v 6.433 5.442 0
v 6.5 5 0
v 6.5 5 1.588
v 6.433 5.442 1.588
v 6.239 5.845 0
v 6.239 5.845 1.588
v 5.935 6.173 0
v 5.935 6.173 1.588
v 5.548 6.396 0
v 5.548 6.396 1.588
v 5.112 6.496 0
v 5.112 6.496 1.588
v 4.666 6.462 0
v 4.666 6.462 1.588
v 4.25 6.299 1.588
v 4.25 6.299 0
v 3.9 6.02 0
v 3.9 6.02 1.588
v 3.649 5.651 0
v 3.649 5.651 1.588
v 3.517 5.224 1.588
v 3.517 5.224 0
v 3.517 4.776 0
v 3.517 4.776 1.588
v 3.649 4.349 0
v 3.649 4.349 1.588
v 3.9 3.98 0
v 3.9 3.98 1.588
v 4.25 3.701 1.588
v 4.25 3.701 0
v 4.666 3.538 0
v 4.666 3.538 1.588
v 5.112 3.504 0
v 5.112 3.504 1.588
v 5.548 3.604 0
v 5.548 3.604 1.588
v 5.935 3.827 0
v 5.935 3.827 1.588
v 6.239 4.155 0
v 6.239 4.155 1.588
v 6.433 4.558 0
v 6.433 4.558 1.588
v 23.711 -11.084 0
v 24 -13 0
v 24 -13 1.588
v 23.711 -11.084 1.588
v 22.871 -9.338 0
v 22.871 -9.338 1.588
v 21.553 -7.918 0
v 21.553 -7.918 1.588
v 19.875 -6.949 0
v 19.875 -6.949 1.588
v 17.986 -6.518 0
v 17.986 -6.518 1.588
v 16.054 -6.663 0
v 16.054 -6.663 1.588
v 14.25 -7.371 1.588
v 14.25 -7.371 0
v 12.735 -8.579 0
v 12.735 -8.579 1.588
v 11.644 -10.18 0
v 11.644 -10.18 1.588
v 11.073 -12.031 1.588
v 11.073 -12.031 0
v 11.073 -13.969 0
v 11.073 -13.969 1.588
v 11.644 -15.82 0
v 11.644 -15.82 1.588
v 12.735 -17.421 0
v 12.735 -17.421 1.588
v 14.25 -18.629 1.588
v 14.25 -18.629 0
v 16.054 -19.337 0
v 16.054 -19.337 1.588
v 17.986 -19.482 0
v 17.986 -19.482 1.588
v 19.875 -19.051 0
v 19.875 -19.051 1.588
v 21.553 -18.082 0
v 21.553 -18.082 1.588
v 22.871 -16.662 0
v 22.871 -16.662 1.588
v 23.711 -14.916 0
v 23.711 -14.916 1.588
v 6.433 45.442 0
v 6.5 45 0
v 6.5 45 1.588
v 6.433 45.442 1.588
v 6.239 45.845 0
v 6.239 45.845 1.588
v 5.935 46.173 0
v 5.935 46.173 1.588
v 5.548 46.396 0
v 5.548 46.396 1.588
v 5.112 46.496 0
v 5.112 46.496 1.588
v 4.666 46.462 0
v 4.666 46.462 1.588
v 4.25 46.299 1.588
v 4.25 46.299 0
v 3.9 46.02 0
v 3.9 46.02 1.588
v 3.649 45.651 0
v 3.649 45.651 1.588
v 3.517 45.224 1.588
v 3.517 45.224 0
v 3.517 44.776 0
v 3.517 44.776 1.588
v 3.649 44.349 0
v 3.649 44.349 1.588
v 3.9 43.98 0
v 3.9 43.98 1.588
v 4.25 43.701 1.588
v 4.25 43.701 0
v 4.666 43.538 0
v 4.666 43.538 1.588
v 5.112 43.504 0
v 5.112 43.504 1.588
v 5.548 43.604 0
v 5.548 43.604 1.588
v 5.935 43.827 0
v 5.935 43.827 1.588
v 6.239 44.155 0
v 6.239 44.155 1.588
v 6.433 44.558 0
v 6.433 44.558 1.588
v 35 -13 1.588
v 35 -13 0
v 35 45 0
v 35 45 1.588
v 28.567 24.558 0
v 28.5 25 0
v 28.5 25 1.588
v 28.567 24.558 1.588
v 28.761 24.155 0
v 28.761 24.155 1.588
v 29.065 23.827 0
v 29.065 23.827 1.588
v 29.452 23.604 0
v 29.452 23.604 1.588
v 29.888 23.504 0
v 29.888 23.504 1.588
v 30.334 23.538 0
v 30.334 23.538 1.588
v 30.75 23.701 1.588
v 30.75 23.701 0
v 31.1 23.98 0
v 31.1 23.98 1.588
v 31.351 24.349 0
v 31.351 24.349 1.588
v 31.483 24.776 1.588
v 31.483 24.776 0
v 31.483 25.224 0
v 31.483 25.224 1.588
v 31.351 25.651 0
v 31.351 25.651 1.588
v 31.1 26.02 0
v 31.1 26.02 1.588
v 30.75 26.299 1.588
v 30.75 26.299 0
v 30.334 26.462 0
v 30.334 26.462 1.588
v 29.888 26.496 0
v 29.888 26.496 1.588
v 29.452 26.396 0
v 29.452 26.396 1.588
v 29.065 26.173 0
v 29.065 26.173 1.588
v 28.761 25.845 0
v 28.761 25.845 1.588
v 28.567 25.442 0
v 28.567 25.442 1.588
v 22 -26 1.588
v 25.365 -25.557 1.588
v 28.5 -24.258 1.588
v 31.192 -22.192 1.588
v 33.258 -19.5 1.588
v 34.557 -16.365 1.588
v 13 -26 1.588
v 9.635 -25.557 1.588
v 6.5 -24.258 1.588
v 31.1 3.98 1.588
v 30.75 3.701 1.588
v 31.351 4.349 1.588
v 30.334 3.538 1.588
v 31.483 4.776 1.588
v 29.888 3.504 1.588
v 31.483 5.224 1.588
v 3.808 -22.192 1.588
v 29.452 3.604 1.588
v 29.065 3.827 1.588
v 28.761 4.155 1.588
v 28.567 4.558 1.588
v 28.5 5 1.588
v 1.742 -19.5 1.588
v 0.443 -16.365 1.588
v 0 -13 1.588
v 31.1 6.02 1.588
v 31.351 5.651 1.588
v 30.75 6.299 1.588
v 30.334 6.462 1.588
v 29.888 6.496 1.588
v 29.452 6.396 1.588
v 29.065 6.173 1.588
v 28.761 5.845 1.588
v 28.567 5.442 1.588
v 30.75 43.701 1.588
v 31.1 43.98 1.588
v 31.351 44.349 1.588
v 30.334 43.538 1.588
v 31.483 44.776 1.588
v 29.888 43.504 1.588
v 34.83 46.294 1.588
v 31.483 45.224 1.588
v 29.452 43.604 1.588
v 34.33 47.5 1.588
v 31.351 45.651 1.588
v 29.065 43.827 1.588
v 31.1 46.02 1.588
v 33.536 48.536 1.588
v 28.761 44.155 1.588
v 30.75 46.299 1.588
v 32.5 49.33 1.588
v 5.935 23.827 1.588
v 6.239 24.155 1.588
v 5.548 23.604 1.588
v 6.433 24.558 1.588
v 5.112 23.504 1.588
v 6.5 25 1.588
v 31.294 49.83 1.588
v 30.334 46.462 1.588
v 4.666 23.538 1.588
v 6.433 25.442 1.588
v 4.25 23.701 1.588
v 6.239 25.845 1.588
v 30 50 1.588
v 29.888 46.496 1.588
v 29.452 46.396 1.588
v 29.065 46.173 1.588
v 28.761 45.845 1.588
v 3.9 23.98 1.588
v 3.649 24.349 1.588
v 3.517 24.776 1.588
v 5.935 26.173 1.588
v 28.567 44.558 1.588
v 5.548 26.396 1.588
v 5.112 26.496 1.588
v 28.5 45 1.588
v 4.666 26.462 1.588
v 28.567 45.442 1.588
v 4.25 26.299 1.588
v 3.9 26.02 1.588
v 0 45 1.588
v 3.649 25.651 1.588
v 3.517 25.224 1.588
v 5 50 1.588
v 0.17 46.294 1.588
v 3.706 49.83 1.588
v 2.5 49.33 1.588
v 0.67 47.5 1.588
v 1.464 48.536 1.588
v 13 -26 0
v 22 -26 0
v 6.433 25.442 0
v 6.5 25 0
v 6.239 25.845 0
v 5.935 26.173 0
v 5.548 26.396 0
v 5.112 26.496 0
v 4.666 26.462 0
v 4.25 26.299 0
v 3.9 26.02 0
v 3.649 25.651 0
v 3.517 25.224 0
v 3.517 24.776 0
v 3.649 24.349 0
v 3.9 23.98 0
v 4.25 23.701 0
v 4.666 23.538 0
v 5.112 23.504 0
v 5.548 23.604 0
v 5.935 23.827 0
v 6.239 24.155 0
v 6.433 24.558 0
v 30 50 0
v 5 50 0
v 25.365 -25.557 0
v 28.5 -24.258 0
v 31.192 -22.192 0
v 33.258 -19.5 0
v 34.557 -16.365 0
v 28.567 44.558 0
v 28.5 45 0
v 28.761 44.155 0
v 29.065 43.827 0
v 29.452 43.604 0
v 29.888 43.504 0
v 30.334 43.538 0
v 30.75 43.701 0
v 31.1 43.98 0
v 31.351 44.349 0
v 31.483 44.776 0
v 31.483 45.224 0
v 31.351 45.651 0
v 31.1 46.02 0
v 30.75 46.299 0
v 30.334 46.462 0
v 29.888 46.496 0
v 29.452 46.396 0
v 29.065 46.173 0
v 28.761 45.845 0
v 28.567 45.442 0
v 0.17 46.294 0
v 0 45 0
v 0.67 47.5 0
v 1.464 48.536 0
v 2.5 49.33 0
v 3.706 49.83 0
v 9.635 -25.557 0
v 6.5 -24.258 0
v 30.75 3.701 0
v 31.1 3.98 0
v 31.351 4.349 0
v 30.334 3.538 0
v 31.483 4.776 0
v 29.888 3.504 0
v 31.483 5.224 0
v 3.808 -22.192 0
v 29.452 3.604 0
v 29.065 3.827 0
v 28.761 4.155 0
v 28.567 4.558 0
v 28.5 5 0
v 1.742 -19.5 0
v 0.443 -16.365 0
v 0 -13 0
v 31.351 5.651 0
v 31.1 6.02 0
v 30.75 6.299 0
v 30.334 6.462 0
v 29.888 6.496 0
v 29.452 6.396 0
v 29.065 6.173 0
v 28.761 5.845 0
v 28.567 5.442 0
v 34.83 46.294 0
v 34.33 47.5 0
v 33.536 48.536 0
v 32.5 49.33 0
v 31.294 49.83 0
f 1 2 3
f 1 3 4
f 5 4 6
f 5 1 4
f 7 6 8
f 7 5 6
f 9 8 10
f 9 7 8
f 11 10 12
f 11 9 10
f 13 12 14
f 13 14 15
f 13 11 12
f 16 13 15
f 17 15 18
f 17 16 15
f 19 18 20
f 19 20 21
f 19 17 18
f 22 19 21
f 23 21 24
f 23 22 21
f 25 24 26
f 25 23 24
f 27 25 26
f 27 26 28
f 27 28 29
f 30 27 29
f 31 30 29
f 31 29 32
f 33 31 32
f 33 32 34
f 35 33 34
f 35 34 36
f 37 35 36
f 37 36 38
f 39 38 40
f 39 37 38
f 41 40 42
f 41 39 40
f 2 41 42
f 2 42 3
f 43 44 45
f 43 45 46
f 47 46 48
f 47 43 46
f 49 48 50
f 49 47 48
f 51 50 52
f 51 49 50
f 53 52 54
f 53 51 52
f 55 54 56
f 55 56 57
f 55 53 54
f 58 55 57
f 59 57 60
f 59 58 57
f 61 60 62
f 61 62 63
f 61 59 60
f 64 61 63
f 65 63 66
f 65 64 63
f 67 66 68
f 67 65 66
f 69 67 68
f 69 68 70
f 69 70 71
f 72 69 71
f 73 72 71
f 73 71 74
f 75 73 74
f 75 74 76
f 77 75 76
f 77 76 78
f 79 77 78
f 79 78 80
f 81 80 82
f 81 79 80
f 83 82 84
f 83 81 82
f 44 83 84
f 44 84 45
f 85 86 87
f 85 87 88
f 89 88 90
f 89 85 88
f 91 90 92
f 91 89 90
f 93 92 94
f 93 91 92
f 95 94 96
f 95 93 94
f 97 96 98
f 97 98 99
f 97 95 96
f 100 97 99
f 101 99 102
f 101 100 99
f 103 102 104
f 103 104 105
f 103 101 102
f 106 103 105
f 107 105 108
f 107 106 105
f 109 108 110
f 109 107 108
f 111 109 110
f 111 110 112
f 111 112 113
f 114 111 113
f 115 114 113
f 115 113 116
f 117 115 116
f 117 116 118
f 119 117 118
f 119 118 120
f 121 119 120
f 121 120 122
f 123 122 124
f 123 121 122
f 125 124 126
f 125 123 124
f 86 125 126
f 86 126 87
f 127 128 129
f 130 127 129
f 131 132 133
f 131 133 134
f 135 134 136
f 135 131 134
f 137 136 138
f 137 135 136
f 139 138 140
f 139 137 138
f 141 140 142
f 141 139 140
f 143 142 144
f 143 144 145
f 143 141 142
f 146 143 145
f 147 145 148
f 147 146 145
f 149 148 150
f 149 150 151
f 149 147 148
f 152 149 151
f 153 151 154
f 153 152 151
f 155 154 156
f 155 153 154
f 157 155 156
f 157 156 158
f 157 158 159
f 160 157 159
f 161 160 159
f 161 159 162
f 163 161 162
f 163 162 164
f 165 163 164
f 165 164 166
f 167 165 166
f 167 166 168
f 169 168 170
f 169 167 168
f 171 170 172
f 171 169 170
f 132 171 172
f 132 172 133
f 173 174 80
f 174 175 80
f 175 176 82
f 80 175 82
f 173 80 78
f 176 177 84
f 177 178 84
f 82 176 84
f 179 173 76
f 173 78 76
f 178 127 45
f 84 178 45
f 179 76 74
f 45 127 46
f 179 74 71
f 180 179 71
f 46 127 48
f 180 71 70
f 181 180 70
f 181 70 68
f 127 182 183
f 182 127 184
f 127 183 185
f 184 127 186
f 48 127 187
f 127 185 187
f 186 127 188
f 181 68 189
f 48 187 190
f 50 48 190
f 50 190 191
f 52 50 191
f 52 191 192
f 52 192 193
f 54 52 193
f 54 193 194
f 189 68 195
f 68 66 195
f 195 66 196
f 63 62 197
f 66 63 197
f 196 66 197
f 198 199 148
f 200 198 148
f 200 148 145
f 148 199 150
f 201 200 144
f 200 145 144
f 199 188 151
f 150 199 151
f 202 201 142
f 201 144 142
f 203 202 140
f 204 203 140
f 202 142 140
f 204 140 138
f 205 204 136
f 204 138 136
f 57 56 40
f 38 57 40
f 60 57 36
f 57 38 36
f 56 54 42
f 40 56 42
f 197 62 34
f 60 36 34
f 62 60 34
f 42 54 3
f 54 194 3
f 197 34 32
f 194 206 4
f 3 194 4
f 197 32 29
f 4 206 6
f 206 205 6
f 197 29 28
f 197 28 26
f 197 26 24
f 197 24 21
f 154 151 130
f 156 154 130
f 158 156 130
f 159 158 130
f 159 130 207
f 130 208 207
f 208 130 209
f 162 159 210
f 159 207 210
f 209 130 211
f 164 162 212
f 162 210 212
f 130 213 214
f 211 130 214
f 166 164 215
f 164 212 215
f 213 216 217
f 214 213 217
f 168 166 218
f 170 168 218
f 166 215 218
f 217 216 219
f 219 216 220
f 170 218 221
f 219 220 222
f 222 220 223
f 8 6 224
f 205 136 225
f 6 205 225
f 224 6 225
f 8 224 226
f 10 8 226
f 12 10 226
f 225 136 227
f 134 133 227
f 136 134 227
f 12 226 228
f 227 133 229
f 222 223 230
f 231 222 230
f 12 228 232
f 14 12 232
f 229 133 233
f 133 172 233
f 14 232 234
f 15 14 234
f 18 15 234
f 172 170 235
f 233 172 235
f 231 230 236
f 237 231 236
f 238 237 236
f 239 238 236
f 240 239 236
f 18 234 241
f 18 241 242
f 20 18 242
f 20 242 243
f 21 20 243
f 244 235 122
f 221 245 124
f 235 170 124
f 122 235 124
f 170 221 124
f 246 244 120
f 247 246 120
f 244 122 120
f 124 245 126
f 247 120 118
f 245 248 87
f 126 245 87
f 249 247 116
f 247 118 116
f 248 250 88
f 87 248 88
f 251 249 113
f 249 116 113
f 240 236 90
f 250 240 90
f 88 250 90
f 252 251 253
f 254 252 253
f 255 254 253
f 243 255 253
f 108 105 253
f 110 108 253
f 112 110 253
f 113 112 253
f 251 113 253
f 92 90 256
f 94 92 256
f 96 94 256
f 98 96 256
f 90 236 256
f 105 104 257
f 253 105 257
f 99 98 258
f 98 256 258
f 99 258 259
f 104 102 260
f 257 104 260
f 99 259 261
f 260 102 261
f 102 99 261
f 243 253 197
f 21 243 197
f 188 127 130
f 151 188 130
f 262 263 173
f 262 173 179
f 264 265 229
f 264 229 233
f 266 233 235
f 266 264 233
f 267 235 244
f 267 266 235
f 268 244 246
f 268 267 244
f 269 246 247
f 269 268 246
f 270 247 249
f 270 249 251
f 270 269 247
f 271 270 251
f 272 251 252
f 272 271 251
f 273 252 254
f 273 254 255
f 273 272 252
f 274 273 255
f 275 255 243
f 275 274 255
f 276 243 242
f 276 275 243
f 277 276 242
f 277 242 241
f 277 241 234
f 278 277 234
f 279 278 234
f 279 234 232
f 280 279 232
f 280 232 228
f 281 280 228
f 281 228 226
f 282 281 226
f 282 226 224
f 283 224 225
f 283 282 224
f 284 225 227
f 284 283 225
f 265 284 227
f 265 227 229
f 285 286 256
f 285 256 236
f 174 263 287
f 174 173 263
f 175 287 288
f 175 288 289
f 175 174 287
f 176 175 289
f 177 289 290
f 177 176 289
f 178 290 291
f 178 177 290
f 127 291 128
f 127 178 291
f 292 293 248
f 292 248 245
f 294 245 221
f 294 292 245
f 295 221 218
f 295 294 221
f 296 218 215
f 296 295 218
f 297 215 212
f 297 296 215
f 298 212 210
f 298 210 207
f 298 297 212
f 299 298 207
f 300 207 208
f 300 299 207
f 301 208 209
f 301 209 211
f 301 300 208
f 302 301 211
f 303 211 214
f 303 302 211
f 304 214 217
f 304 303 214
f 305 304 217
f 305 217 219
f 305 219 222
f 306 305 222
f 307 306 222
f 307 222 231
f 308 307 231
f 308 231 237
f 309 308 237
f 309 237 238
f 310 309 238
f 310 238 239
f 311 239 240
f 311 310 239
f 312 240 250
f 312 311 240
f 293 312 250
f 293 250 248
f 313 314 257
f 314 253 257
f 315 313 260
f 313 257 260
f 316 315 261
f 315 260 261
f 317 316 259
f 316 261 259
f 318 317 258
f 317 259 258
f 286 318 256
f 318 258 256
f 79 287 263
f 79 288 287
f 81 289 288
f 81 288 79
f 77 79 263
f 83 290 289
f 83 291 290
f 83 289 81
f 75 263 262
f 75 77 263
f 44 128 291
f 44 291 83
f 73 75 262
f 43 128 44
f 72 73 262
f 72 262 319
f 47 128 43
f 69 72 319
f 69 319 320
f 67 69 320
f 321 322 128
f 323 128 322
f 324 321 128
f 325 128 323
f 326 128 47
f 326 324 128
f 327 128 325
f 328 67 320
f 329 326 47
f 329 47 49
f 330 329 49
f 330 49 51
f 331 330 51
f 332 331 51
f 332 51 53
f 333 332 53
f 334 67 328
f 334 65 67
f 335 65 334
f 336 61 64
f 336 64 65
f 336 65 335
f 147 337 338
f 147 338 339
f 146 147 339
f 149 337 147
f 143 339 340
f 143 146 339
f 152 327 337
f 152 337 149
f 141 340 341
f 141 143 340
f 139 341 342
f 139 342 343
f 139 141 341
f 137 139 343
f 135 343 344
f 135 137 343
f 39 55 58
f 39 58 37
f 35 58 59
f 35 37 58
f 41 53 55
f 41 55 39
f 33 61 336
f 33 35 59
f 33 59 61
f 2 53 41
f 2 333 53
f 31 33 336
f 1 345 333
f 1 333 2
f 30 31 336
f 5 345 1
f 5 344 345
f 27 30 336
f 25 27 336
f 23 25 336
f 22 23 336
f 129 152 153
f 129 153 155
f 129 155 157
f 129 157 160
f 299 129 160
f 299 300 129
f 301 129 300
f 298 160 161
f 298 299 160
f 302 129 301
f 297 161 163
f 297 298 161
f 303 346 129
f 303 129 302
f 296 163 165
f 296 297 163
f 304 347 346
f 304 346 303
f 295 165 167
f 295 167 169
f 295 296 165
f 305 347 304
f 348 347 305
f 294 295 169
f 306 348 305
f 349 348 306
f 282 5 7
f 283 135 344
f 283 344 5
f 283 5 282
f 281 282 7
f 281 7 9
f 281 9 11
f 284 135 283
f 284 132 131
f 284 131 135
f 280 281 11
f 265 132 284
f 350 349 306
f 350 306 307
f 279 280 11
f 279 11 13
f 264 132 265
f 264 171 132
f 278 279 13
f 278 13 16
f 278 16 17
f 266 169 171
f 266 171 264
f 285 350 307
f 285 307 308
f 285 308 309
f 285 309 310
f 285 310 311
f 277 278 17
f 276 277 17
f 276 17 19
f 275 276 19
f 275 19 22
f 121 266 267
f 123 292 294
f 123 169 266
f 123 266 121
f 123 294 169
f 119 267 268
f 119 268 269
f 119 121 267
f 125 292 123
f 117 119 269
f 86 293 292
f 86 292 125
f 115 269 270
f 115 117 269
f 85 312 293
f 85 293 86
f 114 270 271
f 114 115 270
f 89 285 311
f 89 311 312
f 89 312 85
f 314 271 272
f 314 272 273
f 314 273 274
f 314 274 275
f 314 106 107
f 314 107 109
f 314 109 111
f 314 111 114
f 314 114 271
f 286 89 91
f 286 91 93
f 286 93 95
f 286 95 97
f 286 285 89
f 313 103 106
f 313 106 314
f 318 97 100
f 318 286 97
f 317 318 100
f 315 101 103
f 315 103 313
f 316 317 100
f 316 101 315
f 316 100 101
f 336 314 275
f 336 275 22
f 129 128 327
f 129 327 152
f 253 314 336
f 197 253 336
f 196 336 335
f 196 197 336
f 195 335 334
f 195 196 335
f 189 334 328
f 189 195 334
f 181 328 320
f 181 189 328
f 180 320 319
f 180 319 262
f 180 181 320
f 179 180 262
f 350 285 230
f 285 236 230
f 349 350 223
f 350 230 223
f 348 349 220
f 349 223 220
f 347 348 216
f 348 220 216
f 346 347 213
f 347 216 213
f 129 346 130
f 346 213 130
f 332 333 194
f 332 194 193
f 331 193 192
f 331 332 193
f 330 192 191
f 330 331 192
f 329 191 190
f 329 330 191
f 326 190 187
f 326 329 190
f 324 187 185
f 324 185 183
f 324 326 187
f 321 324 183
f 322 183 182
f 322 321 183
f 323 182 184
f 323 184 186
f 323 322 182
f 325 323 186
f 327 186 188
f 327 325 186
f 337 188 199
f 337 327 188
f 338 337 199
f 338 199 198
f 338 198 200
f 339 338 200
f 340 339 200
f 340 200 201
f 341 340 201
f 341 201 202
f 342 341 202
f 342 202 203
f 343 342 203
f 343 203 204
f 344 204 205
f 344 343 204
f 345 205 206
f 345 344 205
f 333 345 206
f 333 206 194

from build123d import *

# Parameters (mm, degrees)
SKETCH1_R           = 6.5
SKETCH1_R_2         = 1.5
BOSS_EXTRUDE1_DEPTH = 1.5875
FILLET1_R           = 5
FILLET2_R           = 13


with BuildPart() as part:
    # Sketch1 → Boss-Extrude1 (new body)
    with BuildSketch(Plane.XY):
        Polygon((0, 0), (0, 50), (35, 50), (35, 0), (35, -26), (0, -26), align=None)
        with Locations((17.5, -13)):
            Circle(SKETCH1_R, mode=Mode.SUBTRACT)
        with Locations((5, 45)):
            Circle(SKETCH1_R_2, mode=Mode.SUBTRACT)
        with Locations((5, 25)):
            Circle(SKETCH1_R_2, mode=Mode.SUBTRACT)
        with Locations((5, 5)):
            Circle(SKETCH1_R_2, mode=Mode.SUBTRACT)
        with Locations(Location((30, 5, 0), (0, 0, 180))):
            Circle(SKETCH1_R_2, mode=Mode.SUBTRACT)
        with Locations(Location((30, 25, 0), (0, 0, 180))):
            Circle(SKETCH1_R_2, mode=Mode.SUBTRACT)
        with Locations(Location((30, 45, 0), (0, 0, 180))):
            Circle(SKETCH1_R_2, mode=Mode.SUBTRACT)
    extrude(amount=BOSS_EXTRUDE1_DEPTH)

    # Fillet1
    fillet1_edges = [part.edges().sort_by_distance(p)[0] for p in [
        (0, 50, 0.79375),
        (35, 50, 0.79375),
    ]]
    fillet(fillet1_edges, radius=FILLET1_R)

    # Fillet2
    fillet2_edges = [part.edges().sort_by_distance(p)[0] for p in [
        (35, -26, 0.79375),
        (0, -26, 0.79375),
    ]]
    fillet(fillet2_edges, radius=FILLET2_R)


solid = part.part
